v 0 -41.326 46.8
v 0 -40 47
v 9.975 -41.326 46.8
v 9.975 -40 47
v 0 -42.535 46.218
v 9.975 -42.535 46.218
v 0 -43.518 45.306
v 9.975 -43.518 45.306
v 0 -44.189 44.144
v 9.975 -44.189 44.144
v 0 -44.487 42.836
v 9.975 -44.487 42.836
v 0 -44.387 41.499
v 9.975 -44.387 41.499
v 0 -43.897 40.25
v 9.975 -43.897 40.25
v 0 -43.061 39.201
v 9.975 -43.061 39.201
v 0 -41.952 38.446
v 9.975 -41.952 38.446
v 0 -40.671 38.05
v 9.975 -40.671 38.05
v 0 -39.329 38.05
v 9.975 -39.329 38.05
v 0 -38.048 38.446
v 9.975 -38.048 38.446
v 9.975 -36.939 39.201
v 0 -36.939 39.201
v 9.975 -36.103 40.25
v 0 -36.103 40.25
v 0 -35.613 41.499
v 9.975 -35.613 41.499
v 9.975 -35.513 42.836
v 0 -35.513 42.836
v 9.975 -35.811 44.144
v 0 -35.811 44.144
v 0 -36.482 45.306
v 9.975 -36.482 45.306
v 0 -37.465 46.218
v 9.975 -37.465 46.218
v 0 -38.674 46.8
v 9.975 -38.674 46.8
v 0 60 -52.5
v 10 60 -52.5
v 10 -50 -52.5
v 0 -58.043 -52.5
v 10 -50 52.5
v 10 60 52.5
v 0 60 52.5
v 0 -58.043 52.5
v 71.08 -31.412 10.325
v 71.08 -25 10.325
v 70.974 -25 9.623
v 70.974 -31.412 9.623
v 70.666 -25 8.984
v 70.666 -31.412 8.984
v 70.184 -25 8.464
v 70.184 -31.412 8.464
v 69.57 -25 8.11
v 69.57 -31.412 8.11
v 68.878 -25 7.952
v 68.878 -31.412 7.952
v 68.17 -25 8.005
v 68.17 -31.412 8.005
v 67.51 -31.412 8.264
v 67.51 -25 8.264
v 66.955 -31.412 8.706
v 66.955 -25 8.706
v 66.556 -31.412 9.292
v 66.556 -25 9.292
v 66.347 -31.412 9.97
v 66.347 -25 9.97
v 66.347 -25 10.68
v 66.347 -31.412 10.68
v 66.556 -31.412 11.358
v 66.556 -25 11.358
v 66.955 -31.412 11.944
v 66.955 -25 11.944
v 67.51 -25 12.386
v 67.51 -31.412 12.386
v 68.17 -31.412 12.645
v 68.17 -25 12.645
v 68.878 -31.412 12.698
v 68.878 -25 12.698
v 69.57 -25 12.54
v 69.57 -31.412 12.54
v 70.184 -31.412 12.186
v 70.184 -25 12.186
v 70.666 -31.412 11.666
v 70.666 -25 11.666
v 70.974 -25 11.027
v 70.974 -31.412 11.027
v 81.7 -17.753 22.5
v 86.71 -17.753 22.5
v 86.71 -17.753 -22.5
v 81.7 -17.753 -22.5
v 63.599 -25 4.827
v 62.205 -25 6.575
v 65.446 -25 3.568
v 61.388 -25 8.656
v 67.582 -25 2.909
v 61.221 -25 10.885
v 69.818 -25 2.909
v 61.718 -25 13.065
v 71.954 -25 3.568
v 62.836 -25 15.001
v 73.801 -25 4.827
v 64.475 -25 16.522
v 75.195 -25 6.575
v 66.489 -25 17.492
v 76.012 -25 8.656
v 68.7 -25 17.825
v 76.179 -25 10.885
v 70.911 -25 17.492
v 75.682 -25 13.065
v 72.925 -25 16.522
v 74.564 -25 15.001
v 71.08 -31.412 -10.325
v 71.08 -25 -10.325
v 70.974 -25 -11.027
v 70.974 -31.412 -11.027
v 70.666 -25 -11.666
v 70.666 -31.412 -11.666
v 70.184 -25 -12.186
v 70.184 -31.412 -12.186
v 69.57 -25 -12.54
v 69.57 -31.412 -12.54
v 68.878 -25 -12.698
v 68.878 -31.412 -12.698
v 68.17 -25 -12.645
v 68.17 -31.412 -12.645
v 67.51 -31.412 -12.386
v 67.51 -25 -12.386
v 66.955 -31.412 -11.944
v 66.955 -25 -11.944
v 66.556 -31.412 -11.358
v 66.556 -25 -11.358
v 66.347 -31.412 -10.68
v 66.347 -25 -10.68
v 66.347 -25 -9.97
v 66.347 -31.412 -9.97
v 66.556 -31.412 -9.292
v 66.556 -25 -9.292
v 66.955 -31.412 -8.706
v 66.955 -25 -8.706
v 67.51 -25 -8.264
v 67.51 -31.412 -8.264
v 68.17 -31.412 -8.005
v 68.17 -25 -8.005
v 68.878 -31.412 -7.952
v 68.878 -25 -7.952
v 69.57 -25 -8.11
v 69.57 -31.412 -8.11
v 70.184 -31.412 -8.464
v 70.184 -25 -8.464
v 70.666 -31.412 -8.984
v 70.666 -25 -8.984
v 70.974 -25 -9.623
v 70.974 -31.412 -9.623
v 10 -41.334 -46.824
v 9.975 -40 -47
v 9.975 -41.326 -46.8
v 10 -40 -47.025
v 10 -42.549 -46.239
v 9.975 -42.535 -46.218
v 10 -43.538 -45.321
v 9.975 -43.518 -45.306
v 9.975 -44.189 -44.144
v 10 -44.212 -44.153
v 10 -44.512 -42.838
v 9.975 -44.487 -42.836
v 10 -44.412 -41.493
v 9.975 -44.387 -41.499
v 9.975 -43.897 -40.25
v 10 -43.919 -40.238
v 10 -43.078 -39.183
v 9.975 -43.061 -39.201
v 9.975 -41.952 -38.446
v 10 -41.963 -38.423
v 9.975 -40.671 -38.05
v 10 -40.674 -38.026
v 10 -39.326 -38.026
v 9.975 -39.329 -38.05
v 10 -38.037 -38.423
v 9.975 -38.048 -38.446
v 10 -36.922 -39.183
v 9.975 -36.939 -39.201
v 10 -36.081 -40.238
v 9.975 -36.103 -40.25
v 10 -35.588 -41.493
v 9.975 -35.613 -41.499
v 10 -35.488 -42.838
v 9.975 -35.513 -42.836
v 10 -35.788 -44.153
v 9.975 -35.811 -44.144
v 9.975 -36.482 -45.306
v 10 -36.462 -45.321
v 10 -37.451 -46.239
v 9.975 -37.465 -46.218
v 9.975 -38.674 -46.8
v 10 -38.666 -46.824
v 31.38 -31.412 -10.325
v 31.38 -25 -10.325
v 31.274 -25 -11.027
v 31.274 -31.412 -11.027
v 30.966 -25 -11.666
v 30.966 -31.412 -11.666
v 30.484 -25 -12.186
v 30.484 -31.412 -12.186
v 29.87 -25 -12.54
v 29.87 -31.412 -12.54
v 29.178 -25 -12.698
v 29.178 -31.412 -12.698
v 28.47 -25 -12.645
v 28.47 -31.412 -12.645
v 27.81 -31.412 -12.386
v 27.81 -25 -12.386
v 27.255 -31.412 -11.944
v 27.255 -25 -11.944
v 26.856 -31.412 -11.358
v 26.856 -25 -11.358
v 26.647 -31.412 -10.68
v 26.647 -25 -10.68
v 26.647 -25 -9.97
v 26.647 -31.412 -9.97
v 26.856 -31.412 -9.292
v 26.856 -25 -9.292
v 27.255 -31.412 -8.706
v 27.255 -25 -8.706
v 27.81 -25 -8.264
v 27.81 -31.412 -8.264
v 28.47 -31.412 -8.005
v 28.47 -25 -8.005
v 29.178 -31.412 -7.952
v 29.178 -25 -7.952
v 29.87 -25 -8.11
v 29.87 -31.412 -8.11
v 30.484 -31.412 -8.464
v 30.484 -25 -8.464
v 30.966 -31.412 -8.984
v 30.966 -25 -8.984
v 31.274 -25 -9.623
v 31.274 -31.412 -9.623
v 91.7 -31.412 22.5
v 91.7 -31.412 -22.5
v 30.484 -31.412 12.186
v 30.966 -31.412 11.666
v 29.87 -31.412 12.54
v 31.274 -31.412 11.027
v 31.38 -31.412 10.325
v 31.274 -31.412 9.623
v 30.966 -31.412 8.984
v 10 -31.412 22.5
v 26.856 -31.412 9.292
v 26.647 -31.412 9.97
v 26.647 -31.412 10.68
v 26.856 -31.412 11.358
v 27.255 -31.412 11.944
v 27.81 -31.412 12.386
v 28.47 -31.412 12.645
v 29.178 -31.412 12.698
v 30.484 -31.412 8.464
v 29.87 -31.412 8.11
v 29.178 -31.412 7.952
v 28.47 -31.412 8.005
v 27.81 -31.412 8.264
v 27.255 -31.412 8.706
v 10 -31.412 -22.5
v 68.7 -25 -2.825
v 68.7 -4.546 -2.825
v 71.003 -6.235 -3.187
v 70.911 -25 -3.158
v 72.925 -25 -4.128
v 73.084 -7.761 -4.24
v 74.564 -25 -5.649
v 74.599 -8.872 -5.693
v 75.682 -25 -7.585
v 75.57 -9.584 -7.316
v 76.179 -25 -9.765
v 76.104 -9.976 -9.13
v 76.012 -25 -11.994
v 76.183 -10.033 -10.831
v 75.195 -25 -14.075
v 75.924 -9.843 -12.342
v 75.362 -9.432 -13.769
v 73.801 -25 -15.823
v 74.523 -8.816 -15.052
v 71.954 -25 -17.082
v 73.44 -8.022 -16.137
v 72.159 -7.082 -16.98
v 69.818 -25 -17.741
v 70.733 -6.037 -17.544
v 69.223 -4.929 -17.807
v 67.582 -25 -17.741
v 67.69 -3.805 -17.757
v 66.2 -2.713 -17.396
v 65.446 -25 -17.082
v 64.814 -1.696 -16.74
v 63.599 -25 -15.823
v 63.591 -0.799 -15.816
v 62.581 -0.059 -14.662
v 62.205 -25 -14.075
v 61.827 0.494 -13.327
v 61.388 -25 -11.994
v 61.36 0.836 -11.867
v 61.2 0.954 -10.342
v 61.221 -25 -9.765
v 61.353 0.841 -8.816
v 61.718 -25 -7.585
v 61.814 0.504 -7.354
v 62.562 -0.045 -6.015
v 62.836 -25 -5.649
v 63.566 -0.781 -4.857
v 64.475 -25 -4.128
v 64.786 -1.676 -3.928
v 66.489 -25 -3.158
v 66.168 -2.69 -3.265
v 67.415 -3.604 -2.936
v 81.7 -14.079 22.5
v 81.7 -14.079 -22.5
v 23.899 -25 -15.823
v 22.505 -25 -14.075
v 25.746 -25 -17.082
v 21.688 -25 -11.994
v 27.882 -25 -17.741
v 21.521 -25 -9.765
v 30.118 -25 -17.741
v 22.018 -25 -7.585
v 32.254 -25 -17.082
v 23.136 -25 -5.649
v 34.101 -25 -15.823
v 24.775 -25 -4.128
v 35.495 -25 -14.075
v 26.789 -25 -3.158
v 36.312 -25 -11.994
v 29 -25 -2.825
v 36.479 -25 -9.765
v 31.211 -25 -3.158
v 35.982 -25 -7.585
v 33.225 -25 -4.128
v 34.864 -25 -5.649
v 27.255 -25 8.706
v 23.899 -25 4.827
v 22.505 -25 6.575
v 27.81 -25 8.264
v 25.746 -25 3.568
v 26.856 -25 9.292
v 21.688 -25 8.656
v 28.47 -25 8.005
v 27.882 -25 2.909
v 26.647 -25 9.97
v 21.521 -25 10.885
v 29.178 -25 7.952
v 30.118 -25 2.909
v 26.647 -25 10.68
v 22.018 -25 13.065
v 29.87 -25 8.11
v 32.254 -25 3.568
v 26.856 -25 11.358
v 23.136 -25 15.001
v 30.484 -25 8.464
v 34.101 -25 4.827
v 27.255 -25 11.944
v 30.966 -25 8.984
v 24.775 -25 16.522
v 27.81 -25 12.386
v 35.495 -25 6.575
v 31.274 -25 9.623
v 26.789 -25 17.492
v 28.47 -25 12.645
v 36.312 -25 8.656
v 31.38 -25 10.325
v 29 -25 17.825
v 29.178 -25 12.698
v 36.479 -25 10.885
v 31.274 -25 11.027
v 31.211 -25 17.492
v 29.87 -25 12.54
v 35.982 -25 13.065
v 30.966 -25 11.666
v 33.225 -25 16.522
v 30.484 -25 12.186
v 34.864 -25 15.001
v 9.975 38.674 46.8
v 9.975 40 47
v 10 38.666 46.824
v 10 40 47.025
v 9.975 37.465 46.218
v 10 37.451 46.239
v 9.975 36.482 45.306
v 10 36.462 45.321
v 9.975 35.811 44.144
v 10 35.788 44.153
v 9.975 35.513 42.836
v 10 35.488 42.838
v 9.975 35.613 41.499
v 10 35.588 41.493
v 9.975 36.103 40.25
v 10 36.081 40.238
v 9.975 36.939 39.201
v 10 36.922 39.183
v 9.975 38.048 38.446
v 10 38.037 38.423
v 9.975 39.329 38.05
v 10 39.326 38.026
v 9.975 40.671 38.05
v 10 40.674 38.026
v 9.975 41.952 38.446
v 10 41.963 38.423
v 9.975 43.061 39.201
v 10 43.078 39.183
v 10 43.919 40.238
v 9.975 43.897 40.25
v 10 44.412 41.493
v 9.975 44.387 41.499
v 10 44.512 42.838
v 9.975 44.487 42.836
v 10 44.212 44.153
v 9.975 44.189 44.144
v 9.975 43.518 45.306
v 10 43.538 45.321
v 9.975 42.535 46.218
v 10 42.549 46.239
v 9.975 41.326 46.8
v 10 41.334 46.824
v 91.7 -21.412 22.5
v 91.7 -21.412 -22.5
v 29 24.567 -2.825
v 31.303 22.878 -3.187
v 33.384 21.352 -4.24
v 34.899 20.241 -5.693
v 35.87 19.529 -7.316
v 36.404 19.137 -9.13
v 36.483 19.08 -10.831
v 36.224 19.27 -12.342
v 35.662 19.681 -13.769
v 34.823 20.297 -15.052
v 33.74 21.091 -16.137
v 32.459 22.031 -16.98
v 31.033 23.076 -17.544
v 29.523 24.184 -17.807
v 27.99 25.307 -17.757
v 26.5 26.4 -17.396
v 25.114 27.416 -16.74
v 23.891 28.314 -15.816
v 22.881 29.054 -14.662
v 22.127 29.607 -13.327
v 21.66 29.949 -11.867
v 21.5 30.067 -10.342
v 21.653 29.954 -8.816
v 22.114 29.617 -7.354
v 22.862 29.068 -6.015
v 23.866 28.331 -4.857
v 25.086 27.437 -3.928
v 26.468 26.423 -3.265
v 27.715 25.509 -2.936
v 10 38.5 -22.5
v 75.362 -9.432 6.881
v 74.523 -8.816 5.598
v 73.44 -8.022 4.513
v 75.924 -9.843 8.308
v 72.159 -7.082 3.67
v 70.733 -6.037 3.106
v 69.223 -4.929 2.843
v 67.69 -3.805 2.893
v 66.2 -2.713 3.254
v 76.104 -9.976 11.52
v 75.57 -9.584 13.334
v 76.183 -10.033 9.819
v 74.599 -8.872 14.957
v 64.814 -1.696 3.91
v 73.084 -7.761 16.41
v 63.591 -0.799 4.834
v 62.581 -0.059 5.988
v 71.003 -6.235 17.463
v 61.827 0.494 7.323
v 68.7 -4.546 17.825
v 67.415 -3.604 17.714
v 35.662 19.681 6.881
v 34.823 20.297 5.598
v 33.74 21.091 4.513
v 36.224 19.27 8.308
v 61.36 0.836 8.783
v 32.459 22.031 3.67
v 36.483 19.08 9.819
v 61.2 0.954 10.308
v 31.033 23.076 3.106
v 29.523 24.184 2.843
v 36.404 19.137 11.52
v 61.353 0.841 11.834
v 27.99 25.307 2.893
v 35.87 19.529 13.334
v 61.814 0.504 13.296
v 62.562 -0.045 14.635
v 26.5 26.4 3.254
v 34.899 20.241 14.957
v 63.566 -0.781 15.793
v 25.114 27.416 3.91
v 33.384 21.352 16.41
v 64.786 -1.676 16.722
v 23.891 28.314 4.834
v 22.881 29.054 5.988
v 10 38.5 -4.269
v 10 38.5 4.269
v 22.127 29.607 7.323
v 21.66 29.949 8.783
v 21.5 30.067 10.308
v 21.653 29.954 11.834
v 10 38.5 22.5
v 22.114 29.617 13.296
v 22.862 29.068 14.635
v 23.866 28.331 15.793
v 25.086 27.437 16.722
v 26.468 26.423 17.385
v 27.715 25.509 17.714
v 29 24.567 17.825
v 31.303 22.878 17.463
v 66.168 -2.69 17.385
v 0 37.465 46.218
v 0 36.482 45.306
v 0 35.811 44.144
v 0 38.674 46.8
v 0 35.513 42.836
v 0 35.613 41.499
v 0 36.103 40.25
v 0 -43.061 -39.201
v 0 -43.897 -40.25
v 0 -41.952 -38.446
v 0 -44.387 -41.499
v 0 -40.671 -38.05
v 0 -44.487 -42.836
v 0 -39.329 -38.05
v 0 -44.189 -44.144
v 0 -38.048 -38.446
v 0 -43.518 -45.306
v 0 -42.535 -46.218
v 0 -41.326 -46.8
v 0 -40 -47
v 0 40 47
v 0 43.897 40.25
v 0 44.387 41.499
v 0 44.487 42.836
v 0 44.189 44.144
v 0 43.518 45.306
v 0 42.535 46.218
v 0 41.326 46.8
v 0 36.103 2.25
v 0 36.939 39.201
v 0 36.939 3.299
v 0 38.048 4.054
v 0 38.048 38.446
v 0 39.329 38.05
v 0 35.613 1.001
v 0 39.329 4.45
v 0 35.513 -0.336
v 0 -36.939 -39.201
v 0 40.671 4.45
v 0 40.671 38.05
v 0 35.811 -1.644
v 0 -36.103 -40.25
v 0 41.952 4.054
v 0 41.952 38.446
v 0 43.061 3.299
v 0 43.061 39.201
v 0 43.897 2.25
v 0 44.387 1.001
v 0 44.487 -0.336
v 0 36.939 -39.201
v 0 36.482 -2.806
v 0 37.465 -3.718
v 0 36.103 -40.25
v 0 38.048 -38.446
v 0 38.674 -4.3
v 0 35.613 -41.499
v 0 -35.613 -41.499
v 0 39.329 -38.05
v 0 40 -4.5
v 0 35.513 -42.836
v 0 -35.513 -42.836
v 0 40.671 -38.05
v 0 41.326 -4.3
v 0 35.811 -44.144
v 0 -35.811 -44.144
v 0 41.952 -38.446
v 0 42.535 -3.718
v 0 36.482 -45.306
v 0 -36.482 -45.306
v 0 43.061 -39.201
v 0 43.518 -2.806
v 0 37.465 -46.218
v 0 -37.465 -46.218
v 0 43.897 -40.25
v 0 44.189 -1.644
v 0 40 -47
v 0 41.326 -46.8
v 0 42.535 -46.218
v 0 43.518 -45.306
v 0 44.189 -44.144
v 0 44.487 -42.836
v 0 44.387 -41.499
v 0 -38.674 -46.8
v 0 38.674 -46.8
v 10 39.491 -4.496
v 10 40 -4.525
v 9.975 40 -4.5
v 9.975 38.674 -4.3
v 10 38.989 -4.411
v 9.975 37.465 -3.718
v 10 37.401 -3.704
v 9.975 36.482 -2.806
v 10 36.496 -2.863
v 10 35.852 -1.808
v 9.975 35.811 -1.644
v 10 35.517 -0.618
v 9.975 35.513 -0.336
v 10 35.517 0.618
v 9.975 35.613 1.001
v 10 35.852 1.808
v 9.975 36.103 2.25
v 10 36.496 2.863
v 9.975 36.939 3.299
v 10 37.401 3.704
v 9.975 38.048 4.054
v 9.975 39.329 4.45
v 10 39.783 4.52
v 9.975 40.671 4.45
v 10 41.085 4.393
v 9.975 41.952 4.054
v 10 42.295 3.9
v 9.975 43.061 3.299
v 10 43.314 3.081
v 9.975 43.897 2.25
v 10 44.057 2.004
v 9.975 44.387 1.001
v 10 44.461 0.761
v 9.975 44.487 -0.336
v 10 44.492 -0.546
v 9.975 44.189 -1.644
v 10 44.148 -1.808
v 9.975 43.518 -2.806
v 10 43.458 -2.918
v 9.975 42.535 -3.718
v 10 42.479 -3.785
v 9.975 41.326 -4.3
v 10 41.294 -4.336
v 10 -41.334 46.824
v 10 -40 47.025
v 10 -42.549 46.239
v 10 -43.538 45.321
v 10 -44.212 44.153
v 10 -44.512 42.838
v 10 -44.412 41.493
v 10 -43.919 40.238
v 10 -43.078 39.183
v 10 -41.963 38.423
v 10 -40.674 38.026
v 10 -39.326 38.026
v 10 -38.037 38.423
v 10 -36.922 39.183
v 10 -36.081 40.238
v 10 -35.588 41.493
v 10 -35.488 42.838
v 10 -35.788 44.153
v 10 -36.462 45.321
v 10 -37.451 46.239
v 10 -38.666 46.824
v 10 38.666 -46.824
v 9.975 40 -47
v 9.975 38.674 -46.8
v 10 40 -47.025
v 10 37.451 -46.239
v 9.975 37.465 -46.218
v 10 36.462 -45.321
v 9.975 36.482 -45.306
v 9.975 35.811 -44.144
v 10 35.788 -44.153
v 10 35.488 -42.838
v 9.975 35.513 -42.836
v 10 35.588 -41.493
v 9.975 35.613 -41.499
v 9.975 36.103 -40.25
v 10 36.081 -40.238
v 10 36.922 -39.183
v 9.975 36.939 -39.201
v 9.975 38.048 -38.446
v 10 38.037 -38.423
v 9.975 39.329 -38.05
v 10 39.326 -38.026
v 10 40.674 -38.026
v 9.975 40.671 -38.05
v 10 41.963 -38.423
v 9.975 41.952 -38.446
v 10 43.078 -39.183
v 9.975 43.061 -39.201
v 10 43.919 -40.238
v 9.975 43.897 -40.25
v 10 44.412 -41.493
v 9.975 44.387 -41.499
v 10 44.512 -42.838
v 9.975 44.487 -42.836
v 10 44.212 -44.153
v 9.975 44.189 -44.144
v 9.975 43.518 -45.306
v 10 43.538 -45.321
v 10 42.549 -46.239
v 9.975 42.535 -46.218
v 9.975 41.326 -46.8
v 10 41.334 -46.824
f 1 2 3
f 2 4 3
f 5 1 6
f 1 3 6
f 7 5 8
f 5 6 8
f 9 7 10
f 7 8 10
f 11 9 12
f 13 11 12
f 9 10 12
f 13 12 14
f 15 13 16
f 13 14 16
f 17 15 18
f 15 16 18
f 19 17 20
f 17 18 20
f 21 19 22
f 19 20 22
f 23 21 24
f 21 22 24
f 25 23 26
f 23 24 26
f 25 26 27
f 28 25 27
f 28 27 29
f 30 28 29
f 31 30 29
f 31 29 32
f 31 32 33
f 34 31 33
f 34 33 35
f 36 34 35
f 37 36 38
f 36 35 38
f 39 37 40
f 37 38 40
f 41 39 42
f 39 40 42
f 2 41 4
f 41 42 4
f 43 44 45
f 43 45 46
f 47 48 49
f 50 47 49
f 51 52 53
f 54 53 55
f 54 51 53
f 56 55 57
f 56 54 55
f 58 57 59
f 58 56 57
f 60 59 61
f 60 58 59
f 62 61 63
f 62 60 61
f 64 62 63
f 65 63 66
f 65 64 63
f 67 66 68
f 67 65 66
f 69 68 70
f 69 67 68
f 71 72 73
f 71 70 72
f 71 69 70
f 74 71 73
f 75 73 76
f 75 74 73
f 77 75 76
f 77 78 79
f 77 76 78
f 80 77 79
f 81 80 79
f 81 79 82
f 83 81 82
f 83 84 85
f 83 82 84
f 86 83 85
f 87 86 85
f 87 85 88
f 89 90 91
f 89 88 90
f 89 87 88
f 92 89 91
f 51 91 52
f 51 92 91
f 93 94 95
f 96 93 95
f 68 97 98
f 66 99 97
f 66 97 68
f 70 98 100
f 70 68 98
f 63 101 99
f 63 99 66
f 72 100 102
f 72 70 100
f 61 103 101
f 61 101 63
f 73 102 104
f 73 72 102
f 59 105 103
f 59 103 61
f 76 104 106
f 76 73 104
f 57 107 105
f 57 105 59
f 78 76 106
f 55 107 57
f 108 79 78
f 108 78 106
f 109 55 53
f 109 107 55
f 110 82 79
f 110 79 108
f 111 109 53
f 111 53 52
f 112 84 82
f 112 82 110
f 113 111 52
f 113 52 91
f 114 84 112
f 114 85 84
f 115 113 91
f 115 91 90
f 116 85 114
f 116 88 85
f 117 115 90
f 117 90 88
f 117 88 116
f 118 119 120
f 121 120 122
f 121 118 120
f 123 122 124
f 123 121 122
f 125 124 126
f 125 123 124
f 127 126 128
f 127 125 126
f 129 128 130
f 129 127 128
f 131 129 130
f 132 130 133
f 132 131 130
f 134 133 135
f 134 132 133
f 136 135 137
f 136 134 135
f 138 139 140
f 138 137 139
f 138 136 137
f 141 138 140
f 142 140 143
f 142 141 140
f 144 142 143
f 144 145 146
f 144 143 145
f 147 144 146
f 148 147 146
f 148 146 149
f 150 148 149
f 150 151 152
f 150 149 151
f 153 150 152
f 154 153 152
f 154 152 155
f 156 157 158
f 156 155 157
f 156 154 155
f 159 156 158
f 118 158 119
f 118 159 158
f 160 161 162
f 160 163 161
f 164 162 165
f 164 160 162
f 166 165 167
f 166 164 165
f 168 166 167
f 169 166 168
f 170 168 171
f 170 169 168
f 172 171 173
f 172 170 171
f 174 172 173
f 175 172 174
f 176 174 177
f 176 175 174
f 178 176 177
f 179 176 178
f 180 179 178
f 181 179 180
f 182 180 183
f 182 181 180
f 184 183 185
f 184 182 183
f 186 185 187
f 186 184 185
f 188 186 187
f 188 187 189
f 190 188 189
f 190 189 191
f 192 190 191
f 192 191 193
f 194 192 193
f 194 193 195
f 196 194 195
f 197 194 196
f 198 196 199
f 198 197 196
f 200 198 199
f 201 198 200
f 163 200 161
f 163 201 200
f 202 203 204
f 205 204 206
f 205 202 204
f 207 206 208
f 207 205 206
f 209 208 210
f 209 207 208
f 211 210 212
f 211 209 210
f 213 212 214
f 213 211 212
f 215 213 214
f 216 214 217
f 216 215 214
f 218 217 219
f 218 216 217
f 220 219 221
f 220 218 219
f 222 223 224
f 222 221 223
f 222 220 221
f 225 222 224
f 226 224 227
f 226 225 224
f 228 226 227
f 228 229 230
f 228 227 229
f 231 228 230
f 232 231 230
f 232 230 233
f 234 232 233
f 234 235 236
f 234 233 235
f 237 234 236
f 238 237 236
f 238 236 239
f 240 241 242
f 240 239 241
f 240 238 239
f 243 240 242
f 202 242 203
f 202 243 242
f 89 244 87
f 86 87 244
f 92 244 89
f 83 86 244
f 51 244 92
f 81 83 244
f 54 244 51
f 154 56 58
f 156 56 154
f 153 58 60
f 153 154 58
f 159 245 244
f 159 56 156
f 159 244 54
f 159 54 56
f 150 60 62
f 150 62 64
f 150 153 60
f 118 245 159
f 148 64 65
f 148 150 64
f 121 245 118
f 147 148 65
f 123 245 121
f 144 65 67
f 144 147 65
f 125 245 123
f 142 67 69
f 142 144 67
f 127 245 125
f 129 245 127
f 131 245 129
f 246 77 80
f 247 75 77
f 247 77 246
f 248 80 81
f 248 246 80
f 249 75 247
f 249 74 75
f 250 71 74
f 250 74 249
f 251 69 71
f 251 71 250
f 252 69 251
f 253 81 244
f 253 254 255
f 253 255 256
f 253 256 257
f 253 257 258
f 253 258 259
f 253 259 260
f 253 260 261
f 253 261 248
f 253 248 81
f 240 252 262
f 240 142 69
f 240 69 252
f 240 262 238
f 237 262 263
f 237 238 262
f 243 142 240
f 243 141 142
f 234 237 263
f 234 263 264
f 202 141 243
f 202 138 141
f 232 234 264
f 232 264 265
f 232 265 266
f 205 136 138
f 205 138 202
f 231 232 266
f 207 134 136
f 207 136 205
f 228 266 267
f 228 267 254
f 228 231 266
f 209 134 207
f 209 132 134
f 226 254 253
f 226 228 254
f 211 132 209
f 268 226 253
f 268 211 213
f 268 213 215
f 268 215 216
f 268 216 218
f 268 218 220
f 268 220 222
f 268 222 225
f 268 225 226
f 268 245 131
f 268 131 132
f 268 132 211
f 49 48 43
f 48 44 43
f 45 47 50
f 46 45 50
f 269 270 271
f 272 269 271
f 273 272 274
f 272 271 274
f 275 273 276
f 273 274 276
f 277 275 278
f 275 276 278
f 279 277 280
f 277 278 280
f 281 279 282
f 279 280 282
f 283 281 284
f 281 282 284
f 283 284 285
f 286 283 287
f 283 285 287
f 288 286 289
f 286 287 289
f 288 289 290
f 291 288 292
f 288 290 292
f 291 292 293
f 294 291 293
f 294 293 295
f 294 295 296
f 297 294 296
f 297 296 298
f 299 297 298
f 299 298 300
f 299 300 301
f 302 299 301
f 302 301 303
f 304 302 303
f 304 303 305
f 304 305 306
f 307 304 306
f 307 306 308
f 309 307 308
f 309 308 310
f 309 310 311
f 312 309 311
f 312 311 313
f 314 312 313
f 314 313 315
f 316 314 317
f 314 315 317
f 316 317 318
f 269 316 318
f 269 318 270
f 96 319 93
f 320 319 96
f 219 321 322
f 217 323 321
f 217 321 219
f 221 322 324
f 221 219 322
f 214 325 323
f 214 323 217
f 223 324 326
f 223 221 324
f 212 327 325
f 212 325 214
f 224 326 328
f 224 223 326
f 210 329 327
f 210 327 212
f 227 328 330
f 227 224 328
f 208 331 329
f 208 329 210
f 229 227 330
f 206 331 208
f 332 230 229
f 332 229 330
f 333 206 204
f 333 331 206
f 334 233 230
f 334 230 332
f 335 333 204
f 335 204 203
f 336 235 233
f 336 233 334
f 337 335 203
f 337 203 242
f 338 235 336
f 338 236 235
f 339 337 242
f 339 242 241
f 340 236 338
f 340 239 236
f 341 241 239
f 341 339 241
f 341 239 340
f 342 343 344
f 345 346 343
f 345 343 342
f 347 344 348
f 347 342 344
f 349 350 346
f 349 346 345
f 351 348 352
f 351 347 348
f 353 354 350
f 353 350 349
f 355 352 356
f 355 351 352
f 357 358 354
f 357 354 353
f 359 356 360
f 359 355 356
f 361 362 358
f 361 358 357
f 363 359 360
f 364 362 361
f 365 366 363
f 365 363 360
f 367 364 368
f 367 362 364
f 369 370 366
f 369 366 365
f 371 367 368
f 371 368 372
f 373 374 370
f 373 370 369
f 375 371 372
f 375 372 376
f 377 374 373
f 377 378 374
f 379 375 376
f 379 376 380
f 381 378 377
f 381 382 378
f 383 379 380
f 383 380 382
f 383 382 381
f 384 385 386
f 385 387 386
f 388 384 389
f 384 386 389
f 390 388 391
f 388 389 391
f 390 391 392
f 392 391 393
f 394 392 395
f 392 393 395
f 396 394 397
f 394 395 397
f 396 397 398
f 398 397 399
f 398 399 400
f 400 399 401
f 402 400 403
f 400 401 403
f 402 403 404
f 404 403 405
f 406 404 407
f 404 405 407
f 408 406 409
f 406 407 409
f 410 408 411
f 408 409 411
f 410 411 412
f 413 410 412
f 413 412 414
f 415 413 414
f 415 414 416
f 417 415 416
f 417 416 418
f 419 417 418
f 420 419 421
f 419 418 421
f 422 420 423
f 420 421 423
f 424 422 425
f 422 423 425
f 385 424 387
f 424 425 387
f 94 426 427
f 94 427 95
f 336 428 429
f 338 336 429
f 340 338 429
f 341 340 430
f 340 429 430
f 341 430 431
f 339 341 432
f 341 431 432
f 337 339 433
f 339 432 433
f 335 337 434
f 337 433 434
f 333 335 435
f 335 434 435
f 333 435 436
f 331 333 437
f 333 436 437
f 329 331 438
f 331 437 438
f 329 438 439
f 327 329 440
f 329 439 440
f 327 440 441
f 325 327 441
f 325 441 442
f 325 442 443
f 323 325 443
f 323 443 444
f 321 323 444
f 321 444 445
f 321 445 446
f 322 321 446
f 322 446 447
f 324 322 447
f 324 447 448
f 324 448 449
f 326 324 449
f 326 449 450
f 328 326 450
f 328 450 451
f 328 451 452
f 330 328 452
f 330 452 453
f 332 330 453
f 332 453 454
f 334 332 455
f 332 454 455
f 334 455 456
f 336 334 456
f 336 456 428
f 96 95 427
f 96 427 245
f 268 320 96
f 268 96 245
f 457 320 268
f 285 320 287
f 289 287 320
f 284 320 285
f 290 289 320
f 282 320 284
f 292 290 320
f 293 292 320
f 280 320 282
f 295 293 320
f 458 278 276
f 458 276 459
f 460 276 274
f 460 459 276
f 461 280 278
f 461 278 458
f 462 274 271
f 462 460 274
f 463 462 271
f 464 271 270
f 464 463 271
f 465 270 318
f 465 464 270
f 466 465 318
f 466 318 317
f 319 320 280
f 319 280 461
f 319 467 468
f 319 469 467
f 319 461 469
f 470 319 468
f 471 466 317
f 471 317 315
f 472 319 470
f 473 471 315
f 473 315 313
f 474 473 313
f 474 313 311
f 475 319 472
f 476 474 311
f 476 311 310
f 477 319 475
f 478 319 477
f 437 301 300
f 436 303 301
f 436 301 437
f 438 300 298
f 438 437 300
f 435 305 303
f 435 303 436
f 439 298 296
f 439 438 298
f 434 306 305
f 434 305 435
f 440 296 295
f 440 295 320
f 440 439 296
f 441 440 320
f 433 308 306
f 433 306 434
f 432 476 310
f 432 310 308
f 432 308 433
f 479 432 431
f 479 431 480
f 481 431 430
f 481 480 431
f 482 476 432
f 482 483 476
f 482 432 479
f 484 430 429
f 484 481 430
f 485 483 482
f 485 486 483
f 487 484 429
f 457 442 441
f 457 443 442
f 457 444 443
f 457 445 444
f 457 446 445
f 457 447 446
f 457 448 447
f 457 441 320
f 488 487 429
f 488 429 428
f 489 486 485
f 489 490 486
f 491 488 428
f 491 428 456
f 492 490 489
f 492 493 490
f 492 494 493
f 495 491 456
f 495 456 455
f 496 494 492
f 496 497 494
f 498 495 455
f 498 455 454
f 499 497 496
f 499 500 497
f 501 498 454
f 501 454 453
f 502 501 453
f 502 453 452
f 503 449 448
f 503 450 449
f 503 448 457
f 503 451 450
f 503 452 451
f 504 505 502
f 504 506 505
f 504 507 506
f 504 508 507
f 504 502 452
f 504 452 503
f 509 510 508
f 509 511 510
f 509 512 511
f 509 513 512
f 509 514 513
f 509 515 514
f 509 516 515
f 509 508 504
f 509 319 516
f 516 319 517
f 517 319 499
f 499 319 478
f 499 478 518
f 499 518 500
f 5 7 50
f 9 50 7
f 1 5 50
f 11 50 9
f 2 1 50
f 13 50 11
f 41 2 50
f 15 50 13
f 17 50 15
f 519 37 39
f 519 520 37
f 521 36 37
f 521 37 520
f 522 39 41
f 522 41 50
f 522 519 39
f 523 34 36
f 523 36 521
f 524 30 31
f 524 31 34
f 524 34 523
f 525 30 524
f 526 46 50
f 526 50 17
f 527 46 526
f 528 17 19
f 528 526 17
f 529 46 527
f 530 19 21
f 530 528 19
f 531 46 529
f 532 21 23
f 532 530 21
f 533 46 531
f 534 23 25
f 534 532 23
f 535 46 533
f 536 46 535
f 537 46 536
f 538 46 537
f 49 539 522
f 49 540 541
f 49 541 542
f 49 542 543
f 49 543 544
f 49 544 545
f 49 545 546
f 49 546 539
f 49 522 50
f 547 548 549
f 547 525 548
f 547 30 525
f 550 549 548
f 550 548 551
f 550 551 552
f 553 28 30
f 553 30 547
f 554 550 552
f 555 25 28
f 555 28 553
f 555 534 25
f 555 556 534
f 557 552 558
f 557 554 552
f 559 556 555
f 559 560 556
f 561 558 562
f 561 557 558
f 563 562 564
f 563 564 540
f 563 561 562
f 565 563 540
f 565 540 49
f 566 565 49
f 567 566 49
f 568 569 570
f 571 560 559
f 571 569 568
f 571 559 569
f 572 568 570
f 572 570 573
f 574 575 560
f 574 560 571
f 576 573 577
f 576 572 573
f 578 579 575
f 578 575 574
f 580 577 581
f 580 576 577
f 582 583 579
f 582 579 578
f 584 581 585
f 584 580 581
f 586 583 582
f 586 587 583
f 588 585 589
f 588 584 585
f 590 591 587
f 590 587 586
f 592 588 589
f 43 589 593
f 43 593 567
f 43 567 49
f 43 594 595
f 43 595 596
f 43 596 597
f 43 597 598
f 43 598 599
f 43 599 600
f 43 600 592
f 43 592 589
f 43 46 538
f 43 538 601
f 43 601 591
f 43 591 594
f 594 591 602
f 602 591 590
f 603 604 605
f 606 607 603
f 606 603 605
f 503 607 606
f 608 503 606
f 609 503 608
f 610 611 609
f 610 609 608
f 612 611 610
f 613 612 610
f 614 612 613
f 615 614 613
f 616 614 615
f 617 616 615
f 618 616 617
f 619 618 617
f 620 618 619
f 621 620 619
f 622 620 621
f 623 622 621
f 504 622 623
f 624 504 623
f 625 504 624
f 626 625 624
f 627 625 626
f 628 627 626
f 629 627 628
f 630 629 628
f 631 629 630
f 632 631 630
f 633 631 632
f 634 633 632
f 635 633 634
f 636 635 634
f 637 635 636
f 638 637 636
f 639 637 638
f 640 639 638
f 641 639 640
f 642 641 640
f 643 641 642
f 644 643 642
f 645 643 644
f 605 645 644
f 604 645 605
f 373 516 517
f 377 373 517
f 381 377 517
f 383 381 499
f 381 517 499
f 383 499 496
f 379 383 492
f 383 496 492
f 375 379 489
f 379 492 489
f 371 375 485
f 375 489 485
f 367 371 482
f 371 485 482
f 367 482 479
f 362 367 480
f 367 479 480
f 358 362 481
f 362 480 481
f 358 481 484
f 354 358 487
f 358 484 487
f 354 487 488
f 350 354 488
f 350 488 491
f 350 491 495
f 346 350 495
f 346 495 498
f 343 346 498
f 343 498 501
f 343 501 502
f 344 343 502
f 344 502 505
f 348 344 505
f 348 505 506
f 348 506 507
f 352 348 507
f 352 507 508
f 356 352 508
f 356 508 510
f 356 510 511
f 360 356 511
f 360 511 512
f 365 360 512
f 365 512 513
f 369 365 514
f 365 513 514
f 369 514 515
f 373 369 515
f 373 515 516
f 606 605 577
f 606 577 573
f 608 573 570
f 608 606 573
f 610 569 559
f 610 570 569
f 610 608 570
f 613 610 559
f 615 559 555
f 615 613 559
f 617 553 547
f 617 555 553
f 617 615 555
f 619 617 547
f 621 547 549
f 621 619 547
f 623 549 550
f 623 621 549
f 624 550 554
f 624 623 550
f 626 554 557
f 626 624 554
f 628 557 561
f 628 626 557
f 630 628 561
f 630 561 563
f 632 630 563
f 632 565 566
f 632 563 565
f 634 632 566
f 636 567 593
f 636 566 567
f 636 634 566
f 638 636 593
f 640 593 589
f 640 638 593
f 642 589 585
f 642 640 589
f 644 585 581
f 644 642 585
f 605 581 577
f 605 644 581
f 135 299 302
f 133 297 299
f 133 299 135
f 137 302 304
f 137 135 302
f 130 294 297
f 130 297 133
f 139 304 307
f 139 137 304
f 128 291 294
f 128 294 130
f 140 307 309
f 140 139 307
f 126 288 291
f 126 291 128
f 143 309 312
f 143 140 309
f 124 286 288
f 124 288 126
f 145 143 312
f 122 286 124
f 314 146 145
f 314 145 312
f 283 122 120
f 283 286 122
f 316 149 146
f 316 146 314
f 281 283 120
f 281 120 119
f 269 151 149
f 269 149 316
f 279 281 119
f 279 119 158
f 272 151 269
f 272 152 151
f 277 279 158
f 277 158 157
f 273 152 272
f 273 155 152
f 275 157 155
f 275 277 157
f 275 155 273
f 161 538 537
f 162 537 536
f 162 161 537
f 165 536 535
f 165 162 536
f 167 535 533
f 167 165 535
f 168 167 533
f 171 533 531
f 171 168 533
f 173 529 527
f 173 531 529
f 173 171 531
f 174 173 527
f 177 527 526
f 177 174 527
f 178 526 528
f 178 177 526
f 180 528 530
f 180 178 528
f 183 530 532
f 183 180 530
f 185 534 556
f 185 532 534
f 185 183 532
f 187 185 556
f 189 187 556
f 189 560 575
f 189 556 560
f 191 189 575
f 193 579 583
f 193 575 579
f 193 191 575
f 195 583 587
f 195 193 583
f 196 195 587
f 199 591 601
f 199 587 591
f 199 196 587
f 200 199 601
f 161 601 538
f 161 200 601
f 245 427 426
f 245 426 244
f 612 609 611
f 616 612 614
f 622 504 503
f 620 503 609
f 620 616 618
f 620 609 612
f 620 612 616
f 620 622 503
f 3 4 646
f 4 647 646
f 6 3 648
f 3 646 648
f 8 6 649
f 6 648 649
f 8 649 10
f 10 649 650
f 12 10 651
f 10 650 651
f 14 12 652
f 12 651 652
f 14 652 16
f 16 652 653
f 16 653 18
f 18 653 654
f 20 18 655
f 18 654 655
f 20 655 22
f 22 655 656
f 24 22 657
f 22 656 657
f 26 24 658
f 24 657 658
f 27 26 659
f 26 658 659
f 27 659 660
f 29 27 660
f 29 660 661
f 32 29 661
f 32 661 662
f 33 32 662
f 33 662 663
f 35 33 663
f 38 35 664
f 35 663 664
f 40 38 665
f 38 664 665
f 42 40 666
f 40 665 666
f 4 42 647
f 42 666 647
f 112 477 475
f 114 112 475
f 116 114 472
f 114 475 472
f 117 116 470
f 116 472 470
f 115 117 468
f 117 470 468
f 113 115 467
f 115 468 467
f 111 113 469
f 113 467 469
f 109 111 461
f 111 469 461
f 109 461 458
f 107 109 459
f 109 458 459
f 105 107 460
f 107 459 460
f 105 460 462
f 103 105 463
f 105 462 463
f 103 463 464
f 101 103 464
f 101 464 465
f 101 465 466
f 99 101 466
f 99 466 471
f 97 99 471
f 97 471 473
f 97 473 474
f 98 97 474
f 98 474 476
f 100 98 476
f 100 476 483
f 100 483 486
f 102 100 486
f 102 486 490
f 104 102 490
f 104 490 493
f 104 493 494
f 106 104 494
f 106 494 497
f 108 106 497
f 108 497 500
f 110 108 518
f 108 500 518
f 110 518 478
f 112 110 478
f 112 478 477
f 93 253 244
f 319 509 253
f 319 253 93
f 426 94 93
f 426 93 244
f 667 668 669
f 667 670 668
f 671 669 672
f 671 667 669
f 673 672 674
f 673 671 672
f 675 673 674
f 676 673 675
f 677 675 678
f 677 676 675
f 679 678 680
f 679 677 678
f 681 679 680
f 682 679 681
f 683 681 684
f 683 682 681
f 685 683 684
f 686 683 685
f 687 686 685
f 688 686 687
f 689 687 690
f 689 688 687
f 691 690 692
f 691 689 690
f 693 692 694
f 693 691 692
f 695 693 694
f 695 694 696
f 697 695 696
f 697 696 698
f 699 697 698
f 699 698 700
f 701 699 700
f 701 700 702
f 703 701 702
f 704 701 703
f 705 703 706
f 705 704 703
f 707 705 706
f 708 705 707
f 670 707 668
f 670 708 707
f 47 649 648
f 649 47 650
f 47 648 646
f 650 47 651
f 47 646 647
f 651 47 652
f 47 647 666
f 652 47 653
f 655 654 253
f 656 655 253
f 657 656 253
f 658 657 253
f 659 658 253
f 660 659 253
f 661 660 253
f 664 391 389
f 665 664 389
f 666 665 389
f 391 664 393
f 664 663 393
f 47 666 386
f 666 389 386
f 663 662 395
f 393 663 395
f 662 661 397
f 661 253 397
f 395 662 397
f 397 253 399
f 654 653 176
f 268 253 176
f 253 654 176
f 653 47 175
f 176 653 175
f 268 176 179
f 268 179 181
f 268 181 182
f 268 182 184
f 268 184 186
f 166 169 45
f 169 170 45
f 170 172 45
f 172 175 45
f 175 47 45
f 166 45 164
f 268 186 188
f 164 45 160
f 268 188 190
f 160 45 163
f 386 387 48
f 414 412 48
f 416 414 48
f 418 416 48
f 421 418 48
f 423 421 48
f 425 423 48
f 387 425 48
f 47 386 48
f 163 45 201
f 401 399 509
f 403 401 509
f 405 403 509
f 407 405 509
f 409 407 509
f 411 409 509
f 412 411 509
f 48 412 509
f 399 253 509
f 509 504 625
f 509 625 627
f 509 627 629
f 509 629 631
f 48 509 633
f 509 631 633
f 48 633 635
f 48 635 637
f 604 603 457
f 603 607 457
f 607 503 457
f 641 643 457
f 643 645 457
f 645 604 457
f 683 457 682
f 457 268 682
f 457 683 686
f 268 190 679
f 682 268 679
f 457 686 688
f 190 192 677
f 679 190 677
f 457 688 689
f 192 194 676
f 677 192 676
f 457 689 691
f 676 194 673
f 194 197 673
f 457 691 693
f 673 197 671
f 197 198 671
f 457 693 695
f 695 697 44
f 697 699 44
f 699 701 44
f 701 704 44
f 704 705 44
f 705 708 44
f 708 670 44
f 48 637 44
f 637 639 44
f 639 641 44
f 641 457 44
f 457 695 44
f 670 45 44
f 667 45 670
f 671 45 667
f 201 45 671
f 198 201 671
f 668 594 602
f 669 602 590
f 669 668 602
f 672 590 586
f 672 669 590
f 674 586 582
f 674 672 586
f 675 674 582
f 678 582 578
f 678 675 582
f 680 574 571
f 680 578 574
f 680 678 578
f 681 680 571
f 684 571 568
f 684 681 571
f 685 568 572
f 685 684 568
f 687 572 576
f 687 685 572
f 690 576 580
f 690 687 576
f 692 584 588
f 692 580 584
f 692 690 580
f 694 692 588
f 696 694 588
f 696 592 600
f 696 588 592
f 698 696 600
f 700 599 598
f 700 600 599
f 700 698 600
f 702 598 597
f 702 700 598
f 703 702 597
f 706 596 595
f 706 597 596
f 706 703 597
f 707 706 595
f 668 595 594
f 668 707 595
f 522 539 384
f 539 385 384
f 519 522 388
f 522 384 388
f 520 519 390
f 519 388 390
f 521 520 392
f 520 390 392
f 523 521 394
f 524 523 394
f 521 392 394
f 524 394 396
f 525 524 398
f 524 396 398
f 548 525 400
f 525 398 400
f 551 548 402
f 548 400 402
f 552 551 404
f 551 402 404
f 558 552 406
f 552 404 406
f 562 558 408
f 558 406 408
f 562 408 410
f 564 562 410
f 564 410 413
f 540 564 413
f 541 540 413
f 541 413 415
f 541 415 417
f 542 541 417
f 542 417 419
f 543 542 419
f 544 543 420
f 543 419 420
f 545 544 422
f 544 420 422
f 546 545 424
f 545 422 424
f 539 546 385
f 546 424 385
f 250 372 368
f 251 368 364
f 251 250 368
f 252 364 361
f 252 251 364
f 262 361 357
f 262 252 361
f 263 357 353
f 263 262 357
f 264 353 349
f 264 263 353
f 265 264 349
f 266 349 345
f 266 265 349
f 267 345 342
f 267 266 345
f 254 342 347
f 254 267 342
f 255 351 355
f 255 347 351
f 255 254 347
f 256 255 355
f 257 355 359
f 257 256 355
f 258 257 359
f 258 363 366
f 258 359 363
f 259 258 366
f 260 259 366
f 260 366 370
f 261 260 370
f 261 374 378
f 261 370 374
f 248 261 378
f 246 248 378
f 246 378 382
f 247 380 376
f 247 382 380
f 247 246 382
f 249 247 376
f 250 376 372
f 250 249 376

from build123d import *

# Parameters (mm, degrees)
BOSS_EXTRUDE1_DEPTH           = 22.5
BOSS_EXTRUDE1_DEPTH_BACK      = 22.5
SKETCH8_W                     = 10
SKETCH8_H                     = 120
BOSS_EXTRUDE2_DEPTH           = 30
M8_CLEARANCE_HOLE2_AT_2_COUNT = 2
M8_CLEARANCE_HOLE2_AT_2_PITCH = 90.58835466
M8_CLEARANCE_HOLE2_AT_3_COUNT = 2
M8_CLEARANCE_HOLE2_AT_3_PITCH = 42.5
BOSS_EXTRUDE3_REACH           = 134.793
SKETCH2_R                     = 2.38
CUT_EXTRUDE1_DEPTH            = 60
CHAMFER4_SIZE                 = 10
CHAMFER4_SIZE_2               = 12.433047379
SKETCH18_R                    = 7.5
CUT_EXTRUDE4_DEPTH            = 85
SKETCH19_W                    = 61.758143573
SKETCH19_H                    = 25.520807093
CUT_EXTRUDE5_DEPTH            = 10


with BuildPart() as part:
    # Sketch1 → Boss-Extrude1 (new, two sides: drawn at the far end of the back side and taken through both)
    with BuildSketch(Plane.XY.offset(-BOSS_EXTRUDE1_DEPTH_BACK)):
        Polygon((0, 60), (10, 60), (10, -21.4124), (91.7, -21.4124), (91.7, -31.4124), (10, -31.4124), (10, -60), (0, -60), align=None)
    extrude(amount=BOSS_EXTRUDE1_DEPTH + BOSS_EXTRUDE1_DEPTH_BACK)

    # Sketch8 → Boss-Extrude2 (add)
    with BuildSketch(Plane(origin=(0, 0, -22.5), x_dir=(-1, 0, 0), z_dir=(0, 0, -1))):
        with Locations((-5, 0)):
            Rectangle(SKETCH8_W, SKETCH8_H)
    boss_extrude2 = extrude(amount=BOSS_EXTRUDE2_DEPTH)

    # Sketch10 → M8 Clearance Hole2 (revolve, cut)
    with BuildSketch(Plane(origin=(10, 40, 0), x_dir=(0, 0, -1), z_dir=(0, 1, 0))):
        Polygon((0, 0), (0, 25.703872786), (4.5, 23), (4.5, 0.025), (4.525, 0), align=None)
    m8_clearance_hole2 = revolve(axis=Axis((16.35, 40, 0), (-1, 0, 0)), mode=Mode.SUBTRACT)

    # M8 Clearance Hole2 at 2: M8 Clearance Hole2 ×2
    with Locations(*[Vector(0, -0.8831157194574106, -0.4691552259617494) * (i * M8_CLEARANCE_HOLE2_AT_2_PITCH) for i in range(1, M8_CLEARANCE_HOLE2_AT_2_COUNT)]):
        add(m8_clearance_hole2, mode=Mode.SUBTRACT)

    # M8 Clearance Hole2 at 3: M8 Clearance Hole2 ×2
    with Locations(*[(0, 0, -i * M8_CLEARANCE_HOLE2_AT_3_PITCH) for i in range(1, M8_CLEARANCE_HOLE2_AT_3_COUNT)]):
        add(m8_clearance_hole2, mode=Mode.SUBTRACT)

    # Boss-Extrude3: up to this face of the body (flat: up to its plane)
    boss_extrude3_end = Plane(part.part.faces().sort_by_distance((50.85, -26.4124, -22.5))[0])
    # Sketch14 → Boss-Extrude3 (add, up to the picked face)
    with BuildSketch(Plane.XY.offset(22.5), mode=Mode.PRIVATE) as boss_extrude3_sk1:
        Polygon((91.7, -21.4124), (10, 38.5), (10, -21.4124), align=None)
    boss_extrude3_tool1 = split(extrude(boss_extrude3_sk1.sketch, amount=-BOSS_EXTRUDE3_REACH, mode=Mode.PRIVATE), bisect_by=boss_extrude3_end, keep=Keep.BOTH, mode=Mode.PRIVATE)
    add(boss_extrude3_tool1.solids().sort_by(Axis((37.233333, -1.4416, 22.5), (0, 0, -1)))[0])

    # Sketch2 → Cut-Extrude1 (cut)
    with BuildSketch(Plane(origin=(0, -31.4124, 0), x_dir=(1, 0, 0), z_dir=(0, 1, 0))):
        with Locations((68.7, 10.325)):
            Circle(SKETCH2_R)
        with Locations((68.7, -10.325)):
            Circle(SKETCH2_R)
        with Locations((29, 10.325)):
            Circle(SKETCH2_R)
        with Locations((29, -10.325)):
            Circle(SKETCH2_R)
    extrude(amount=CUT_EXTRUDE1_DEPTH, mode=Mode.SUBTRACT)

    # Mirror2: Boss-Extrude2, M8 Clearance Hole2 across plane
    add(boss_extrude2.mirror(Plane.XY))
    add(m8_clearance_hole2.mirror(Plane.XY), mode=Mode.SUBTRACT)

    # Mirror2 copy 1 sketch → Mirror2 copy 1 (revolve, cut)
    with BuildSketch(Plane(origin=(10, -40, 42.5), x_dir=(0, 0, 1), z_dir=(0, 1, 0))):
        Polygon((0, 0), (0, -25.703872786), (4.5, -23), (4.5, -0.025), (4.525, 0), align=None)
    revolve(axis=Axis((16.35, -40, 42.5), (1, 0, 0)), mode=Mode.SUBTRACT)

    # Mirror2 copy 2 sketch → Mirror2 copy 2 (revolve, cut)
    with BuildSketch(Plane(origin=(10, 40, 42.5), x_dir=(0, 0, 1), z_dir=(0, 1, 0))):
        Polygon((0, 0), (0, -25.703872786), (4.5, -23), (4.5, -0.025), (4.525, 0), align=None)
    revolve(axis=Axis((16.35, 40, 42.5), (1, 0, 0)), mode=Mode.SUBTRACT)

    # Chamfer4
    # the kernel refuses this chamfer: 12.433047379, 10 mm, written as the material it takes off along each edge
    with BuildSketch(Plane(origin=(10, -60, 84.560907877), x_dir=(0.03755485384602002, 0.9992945676589081, 0), z_dir=(0, 0, -1))) as chamfer4_piece_1:
        Polygon((CHAMFER4_SIZE * 0.999294567659, -CHAMFER4_SIZE * 0.037554853846), (-CHAMFER4_SIZE_2 * 0.037554853846, -CHAMFER4_SIZE_2 * 0.999294567658), (0, 0), align=None)
    extrude(amount=169.121815753, mode=Mode.SUBTRACT)

    # Sketch18 → Cut-Extrude4 (cut)
    with BuildSketch(Plane(origin=(0, 60, 0), x_dir=(1, 0, 0), z_dir=(0, 1, 0))):
        with Locations(Location((29, 10.325, 0), (0, 0, 270))):
            Circle(SKETCH18_R)
        with Locations(Location((29, -10.325, 0), (0, 0, 270))):
            Circle(SKETCH18_R)
        with Locations(Location((68.7, 10.325, 0), (0, 0, 270))):
            Circle(SKETCH18_R)
        with Locations(Location((68.7, -10.325, 0), (0, 0, 270))):
            Circle(SKETCH18_R)
    extrude(amount=-CUT_EXTRUDE4_DEPTH, mode=Mode.SUBTRACT)

    # Sketch19 → Cut-Extrude5 (cut)
    with BuildSketch(Plane(origin=(91.7, 0, 0), x_dir=(0, 0, -1), z_dir=(1, 0, 0))):
        with Locations((3.038191321, -4.992790305)):
            Rectangle(SKETCH19_W, SKETCH19_H)
    extrude(amount=-CUT_EXTRUDE5_DEPTH, mode=Mode.SUBTRACT)


solid = part.part
